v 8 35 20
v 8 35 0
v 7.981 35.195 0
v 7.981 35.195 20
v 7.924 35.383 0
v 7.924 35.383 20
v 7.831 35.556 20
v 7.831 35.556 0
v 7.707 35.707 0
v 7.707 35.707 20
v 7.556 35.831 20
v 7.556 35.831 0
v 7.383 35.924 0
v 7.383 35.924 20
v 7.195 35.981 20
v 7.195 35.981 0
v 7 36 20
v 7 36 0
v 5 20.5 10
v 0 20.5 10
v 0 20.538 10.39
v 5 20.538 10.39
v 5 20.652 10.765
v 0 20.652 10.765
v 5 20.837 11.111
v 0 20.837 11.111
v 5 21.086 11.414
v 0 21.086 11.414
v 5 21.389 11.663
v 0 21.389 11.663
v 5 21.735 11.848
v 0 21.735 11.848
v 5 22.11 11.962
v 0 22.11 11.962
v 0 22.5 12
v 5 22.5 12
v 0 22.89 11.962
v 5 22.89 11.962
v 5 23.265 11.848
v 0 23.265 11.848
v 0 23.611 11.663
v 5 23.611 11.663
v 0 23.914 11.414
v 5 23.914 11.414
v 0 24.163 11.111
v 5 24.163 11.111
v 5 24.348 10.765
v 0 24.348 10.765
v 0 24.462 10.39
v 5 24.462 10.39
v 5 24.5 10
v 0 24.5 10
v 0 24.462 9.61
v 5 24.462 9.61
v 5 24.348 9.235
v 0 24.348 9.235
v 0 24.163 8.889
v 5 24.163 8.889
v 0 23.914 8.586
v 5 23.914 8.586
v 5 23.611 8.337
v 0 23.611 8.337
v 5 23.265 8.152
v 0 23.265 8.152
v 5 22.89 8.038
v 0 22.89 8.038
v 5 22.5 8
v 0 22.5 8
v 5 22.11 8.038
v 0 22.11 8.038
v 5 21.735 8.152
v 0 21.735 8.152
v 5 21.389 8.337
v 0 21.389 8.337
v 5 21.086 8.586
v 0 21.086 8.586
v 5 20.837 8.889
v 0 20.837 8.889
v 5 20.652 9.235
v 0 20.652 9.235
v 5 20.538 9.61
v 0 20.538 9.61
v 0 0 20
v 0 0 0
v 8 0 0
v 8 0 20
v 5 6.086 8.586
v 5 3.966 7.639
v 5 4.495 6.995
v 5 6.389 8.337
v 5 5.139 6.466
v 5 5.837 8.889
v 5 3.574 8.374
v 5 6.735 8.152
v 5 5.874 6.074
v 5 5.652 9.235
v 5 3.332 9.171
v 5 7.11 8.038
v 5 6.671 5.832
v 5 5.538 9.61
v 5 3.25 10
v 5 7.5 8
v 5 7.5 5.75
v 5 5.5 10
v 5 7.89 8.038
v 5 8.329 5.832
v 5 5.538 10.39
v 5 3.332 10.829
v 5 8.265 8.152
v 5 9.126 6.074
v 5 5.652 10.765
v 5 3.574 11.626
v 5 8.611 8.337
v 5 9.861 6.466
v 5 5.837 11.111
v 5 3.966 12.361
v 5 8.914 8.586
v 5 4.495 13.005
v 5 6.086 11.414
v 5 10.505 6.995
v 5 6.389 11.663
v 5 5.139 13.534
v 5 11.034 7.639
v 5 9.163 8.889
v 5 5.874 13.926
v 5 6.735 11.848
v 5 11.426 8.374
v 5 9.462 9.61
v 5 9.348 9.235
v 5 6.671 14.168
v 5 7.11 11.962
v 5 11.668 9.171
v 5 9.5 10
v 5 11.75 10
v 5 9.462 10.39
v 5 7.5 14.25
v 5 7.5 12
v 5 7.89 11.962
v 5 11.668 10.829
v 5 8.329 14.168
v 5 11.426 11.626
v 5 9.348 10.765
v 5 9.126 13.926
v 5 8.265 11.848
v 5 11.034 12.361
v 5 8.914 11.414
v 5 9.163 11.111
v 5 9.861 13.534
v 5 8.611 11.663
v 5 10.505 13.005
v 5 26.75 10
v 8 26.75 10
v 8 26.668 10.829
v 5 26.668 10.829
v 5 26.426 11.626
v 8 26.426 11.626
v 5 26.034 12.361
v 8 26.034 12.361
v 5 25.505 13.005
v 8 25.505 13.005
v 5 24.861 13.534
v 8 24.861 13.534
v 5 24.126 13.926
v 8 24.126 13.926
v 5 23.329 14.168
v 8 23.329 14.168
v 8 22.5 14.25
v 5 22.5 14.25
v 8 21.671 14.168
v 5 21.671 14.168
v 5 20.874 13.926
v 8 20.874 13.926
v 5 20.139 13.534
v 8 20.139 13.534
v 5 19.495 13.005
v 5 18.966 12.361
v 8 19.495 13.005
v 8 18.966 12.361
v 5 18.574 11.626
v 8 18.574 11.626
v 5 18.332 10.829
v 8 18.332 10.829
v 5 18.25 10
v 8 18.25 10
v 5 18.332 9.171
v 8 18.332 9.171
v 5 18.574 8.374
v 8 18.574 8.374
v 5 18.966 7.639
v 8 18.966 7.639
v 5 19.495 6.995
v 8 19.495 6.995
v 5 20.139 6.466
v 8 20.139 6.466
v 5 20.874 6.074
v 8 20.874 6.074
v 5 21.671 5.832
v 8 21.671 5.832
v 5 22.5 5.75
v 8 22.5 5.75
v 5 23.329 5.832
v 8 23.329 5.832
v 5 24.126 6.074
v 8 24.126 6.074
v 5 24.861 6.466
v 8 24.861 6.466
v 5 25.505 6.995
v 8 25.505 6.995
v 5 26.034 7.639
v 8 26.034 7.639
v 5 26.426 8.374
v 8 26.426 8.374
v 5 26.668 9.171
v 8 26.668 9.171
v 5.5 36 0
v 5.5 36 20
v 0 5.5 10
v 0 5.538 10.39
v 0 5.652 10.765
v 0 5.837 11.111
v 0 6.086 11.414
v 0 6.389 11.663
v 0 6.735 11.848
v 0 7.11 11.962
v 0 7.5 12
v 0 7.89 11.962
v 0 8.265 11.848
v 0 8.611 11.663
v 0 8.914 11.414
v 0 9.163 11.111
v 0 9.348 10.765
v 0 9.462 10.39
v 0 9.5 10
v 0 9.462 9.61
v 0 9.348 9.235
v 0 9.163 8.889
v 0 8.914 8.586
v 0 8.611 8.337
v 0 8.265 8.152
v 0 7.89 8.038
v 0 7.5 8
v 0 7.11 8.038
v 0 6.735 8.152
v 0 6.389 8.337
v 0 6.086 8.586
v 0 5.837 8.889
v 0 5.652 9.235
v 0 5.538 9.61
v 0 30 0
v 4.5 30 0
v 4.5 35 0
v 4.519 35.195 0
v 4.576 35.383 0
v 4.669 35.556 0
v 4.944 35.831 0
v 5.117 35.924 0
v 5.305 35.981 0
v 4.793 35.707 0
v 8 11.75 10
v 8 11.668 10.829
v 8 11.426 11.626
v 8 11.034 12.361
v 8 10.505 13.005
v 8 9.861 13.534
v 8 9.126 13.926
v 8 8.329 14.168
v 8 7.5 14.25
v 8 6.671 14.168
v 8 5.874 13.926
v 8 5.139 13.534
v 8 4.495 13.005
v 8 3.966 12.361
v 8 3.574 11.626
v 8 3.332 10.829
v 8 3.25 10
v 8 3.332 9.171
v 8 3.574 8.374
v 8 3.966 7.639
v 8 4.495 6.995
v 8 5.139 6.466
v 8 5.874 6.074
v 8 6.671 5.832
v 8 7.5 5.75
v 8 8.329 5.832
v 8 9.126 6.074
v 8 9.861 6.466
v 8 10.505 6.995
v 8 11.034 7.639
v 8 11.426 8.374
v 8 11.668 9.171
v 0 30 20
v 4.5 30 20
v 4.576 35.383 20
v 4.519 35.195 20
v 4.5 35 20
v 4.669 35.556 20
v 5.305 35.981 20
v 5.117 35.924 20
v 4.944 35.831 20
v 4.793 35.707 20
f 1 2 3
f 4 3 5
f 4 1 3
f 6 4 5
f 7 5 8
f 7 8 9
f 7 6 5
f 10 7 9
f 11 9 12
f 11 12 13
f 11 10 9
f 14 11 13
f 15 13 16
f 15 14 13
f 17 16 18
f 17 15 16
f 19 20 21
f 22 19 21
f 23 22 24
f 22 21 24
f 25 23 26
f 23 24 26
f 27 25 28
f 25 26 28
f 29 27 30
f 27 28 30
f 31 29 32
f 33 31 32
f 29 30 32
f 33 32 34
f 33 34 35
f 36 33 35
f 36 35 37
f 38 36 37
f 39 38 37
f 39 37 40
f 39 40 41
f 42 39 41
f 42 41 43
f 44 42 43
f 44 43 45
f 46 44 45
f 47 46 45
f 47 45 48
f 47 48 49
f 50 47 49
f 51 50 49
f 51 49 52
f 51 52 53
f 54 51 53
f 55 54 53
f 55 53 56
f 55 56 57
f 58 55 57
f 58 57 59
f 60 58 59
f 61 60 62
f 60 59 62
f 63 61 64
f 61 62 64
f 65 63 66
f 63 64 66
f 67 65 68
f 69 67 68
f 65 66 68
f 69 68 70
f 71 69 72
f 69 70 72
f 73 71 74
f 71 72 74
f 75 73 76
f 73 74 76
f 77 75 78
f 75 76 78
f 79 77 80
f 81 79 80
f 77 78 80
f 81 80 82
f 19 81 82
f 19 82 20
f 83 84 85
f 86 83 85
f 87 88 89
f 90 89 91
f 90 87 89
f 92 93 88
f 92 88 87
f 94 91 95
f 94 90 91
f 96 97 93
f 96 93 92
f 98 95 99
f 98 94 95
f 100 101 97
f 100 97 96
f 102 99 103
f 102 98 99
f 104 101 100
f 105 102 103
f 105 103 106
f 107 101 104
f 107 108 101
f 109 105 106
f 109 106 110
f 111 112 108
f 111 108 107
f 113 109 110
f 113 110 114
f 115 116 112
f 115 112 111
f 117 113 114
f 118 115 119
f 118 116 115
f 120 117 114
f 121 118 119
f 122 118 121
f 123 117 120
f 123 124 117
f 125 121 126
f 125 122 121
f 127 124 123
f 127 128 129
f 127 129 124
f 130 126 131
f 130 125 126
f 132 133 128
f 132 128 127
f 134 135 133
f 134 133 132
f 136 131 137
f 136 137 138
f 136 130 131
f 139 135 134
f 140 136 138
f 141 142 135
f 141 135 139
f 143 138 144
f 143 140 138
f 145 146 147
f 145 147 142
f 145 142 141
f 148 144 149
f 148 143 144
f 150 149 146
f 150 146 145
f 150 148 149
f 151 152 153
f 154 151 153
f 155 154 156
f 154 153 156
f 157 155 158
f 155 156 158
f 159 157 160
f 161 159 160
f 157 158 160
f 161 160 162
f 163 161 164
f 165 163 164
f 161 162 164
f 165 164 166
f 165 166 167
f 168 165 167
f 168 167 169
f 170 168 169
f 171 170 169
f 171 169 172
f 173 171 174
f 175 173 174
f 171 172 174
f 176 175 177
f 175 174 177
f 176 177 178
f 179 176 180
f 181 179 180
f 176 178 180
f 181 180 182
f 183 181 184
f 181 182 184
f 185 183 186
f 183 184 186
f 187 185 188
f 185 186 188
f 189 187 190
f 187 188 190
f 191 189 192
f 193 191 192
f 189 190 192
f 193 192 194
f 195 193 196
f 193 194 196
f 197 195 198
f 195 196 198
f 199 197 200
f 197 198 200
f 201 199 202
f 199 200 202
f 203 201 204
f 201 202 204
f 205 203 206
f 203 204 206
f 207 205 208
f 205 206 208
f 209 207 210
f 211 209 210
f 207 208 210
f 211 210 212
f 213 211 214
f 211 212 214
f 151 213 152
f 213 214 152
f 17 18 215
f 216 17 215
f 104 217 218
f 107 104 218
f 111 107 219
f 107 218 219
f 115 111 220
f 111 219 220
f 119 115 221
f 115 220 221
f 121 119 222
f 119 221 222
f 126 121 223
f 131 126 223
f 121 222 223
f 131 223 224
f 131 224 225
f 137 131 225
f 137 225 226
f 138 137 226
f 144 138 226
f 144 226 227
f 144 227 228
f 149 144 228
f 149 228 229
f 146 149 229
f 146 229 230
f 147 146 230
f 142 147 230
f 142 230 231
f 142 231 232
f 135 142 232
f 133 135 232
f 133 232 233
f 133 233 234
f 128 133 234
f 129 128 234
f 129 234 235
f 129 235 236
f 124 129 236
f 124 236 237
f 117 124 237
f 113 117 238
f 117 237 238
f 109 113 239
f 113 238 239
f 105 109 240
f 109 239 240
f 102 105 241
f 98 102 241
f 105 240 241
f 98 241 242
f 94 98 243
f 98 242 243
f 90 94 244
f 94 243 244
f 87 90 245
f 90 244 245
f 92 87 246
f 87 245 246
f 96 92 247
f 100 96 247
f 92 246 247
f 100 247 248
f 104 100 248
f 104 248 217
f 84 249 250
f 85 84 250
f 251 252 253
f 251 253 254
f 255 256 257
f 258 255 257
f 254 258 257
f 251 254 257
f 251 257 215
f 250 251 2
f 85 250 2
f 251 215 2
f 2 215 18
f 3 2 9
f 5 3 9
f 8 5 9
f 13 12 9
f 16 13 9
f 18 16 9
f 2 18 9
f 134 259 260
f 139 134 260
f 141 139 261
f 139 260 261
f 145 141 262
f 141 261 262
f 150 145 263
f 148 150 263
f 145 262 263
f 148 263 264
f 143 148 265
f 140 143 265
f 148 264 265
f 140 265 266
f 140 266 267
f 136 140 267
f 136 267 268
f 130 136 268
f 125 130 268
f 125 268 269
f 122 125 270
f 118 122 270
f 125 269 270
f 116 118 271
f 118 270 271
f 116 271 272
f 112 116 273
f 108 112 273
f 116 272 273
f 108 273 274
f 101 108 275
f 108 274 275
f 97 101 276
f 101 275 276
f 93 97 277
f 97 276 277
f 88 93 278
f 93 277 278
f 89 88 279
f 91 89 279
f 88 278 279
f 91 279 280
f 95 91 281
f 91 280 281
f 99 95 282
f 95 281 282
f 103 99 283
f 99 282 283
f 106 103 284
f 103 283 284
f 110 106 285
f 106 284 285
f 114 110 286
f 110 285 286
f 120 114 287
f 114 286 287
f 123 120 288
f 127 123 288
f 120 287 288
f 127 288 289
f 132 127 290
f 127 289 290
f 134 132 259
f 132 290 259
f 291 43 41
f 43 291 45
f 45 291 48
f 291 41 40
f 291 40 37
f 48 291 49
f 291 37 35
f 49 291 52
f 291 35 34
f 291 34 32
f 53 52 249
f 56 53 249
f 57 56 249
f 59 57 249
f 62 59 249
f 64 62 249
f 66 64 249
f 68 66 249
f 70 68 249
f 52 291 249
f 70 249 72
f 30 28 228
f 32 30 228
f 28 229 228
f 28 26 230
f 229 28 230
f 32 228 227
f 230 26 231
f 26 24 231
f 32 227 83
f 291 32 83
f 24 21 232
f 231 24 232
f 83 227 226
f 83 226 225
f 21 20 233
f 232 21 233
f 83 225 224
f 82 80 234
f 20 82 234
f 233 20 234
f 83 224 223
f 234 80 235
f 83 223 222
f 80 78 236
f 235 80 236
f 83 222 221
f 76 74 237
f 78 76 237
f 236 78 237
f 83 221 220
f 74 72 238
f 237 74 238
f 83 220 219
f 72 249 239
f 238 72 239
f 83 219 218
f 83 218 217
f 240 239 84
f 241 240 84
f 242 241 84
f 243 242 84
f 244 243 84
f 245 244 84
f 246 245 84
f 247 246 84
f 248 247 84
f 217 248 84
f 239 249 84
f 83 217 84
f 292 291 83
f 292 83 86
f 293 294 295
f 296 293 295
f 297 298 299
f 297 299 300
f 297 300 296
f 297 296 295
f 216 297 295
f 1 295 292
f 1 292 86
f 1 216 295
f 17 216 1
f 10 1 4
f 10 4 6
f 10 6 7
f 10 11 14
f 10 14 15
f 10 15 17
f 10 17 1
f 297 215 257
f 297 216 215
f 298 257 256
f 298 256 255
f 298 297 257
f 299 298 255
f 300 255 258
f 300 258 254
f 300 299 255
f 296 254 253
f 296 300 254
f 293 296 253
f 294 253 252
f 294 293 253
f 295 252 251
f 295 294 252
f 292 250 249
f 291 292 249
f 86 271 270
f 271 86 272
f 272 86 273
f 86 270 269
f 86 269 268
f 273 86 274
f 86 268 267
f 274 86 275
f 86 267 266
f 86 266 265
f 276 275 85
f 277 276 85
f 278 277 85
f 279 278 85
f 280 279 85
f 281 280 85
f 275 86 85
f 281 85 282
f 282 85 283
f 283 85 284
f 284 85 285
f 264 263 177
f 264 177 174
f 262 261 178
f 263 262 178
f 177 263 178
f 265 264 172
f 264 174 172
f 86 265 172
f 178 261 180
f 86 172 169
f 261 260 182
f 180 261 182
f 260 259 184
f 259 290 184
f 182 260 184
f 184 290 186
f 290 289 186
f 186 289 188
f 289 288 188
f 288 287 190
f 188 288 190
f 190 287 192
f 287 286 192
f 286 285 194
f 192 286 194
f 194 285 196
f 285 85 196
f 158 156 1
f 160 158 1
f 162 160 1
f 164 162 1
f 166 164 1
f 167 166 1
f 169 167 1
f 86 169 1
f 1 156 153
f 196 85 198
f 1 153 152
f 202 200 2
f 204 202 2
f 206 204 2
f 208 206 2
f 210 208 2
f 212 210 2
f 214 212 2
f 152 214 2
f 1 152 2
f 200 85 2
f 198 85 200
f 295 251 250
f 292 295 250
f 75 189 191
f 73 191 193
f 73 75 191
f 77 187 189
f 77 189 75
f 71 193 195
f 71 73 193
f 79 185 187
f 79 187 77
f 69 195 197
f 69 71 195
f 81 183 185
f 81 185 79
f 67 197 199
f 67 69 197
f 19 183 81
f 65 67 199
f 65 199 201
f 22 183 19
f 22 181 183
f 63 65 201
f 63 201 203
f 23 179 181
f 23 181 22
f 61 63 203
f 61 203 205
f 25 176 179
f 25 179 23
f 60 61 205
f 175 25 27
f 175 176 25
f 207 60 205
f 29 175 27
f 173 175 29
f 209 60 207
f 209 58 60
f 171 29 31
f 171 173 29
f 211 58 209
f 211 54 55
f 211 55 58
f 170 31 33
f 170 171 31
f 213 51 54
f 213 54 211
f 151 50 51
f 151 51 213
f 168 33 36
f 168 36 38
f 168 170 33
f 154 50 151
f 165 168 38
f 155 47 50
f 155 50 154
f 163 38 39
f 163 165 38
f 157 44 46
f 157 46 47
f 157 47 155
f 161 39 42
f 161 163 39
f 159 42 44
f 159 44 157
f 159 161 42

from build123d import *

# Parameters (mm, degrees)
F1_DEPTH = 20
F2_R     = 2
F3_DEPTH = 8.001
F4_R     = 1
F5_R     = 4.25
F6_DEPTH = 3


with BuildPart() as f1:
    # F0 (on Top) → F1 (new body)
    with BuildSketch(Plane.XY):
        Polygon((8, 0), (8, 36), (4.5, 36), (4.5, 30), (0, 30), (0, 0), align=None)
    extrude(amount=F1_DEPTH)

    # F2 (on face) → F3 (cut, through all)
    with BuildSketch(Plane(origin=(0, 0, 0), x_dir=(0, -1, 0), z_dir=(-1, 0, 0))):
        with Locations((-7.5, 10)):
            Circle(F2_R)
        with Locations((-22.5, 10)):
            Circle(F2_R)
    extrude(amount=-F3_DEPTH, mode=Mode.SUBTRACT)

    # F4
    f4_edges = [f1.edges().sort_by_distance(p)[0] for p in [
        (4.5, 36, 10),
        (8, 36, 10),
    ]]
    fillet(f4_edges, radius=F4_R)

    # F5 (on face) → F6 (cut)
    with BuildSketch(Plane.YZ.offset(8)):
        with Locations((22.5, 10)):
            Circle(F5_R)
        with Locations((7.5, 10)):
            Circle(F5_R)
    extrude(amount=-F6_DEPTH, mode=Mode.SUBTRACT)


solid = f1.part
